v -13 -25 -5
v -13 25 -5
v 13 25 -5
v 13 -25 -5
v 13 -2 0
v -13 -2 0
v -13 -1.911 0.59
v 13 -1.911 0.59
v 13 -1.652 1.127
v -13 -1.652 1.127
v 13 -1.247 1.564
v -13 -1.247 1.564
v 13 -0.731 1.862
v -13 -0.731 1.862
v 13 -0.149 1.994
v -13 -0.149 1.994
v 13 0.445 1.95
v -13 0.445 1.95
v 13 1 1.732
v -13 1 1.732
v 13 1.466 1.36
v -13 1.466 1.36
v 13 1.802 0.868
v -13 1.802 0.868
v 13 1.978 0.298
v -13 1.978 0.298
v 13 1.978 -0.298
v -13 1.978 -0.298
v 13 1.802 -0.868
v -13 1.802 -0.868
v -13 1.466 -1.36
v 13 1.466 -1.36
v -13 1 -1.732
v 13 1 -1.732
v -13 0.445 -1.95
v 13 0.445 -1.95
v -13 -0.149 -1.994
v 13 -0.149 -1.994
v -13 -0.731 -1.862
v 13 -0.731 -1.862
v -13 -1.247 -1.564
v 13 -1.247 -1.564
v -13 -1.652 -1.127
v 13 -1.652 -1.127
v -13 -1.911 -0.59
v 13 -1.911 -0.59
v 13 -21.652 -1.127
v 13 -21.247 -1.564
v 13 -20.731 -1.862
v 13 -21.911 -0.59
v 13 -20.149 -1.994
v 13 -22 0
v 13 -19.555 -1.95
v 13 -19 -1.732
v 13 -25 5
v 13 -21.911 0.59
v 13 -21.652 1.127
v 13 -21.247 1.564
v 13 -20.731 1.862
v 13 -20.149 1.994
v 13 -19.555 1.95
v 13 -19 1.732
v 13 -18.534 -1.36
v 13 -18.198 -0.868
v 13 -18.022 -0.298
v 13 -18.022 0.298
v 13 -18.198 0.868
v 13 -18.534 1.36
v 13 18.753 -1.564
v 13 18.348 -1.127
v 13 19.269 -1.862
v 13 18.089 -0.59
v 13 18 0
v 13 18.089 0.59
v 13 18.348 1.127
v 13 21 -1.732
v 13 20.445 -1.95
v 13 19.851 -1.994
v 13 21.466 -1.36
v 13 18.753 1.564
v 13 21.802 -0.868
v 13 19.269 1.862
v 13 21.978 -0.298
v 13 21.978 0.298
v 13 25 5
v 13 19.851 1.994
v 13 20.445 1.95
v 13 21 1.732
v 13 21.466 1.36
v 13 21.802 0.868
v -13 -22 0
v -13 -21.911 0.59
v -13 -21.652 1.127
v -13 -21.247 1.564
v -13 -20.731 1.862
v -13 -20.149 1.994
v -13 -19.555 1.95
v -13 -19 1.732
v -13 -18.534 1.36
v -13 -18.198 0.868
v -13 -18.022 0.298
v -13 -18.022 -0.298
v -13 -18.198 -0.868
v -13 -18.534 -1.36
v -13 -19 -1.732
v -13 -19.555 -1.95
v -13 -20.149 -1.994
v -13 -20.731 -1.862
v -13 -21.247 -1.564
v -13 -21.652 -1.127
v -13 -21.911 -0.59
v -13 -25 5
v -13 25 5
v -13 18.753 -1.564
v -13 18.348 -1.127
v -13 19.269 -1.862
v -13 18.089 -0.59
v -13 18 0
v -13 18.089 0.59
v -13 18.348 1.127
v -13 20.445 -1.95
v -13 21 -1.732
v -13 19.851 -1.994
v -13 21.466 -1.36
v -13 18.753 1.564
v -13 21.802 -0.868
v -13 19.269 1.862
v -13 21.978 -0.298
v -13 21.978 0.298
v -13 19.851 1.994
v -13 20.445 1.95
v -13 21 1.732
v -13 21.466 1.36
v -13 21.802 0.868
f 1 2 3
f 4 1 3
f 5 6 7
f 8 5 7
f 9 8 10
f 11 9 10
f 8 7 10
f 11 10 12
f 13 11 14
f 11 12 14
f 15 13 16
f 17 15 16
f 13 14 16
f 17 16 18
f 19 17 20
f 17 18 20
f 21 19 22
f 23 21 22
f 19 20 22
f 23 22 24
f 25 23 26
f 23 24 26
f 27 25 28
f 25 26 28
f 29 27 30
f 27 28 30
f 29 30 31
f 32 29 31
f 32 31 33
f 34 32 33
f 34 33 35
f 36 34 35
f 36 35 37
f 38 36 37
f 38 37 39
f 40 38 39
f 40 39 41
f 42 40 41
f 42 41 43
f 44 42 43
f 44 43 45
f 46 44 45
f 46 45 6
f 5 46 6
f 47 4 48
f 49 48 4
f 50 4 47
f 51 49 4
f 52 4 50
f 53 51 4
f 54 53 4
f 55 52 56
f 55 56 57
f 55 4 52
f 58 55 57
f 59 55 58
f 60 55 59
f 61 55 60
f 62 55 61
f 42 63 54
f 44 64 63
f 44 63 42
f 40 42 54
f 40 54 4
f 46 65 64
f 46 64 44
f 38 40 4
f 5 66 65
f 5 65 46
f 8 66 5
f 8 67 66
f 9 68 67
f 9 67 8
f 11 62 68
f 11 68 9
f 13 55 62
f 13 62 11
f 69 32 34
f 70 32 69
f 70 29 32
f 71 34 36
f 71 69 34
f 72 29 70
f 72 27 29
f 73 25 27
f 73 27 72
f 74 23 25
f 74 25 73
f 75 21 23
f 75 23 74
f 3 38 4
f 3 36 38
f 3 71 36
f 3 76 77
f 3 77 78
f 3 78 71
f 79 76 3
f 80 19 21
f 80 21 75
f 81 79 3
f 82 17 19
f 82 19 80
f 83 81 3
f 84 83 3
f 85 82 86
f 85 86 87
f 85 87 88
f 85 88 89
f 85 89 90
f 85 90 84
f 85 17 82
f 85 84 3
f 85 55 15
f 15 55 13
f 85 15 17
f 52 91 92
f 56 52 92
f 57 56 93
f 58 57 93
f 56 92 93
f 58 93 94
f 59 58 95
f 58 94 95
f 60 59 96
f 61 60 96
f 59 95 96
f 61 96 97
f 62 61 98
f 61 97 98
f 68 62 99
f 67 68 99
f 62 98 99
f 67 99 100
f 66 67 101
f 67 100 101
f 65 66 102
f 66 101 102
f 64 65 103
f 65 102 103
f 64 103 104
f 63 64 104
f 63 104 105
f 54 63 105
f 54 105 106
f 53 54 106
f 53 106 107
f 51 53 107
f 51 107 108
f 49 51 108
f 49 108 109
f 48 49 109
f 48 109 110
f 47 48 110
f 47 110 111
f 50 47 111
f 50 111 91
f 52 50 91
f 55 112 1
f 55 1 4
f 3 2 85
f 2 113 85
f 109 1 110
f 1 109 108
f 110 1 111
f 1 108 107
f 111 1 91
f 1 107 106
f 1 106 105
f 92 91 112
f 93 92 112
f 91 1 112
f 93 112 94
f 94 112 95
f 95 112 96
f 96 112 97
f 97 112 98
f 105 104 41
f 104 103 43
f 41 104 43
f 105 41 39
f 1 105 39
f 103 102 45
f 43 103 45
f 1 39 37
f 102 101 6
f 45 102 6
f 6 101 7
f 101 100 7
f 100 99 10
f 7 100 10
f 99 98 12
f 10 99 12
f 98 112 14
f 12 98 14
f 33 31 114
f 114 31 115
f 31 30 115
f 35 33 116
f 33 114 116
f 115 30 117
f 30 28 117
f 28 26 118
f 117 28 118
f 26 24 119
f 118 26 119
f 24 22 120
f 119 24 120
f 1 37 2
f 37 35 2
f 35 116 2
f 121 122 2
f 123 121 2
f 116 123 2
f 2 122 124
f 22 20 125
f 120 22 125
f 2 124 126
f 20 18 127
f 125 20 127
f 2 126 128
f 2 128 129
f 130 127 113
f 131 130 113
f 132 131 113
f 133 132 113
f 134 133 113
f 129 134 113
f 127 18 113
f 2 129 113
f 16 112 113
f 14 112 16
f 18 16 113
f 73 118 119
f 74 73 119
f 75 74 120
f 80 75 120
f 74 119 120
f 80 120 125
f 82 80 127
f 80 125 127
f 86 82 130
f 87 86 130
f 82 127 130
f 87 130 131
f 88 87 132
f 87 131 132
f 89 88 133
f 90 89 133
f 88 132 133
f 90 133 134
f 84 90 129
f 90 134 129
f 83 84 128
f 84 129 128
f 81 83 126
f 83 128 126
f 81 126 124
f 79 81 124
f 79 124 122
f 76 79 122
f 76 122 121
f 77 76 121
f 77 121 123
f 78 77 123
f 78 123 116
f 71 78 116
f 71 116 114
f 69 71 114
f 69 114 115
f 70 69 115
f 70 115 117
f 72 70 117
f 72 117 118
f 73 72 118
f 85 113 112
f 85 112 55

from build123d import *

# Parameters (mm, degrees)
F0_W          = 26
F0_H          = 50
F1_DEPTH      = 5
F1_DEPTH_BACK = 5
F2_R          = 2
F3_DEPTH      = 26.001
F4_DEPTH      = 26.001


with BuildPart() as f1:
    # F0 (on Top) → F1 (new body, two sides)
    with BuildSketch(Plane.XY) as f1_sk:
        Rectangle(F0_W, F0_H)
    extrude(amount=F1_DEPTH)
    extrude(f1_sk.sketch, amount=-F1_DEPTH_BACK)

    # F2 (on face) → F3 (cut, through all)
    with BuildSketch(Plane(origin=(-13, 0, 0), x_dir=(0, -1, 0), z_dir=(-1, 0, 0))):
        Circle(F2_R)
        with Locations((20, 0)):
            Circle(F2_R)
        with Locations((-20, 0)):
            Circle(F2_R)
    extrude(amount=-F3_DEPTH, mode=Mode.SUBTRACT)

    # F2 (on face) → F4 (cut, through all)
    with BuildSketch(Plane(origin=(-13, 0, 0), x_dir=(0, -1, 0), z_dir=(-1, 0, 0))):
        Circle(F2_R)
        with Locations((20, 0)):
            Circle(F2_R)
        with Locations((-20, 0)):
            Circle(F2_R)
    extrude(amount=-F4_DEPTH, mode=Mode.SUBTRACT)


solid = f1.part
